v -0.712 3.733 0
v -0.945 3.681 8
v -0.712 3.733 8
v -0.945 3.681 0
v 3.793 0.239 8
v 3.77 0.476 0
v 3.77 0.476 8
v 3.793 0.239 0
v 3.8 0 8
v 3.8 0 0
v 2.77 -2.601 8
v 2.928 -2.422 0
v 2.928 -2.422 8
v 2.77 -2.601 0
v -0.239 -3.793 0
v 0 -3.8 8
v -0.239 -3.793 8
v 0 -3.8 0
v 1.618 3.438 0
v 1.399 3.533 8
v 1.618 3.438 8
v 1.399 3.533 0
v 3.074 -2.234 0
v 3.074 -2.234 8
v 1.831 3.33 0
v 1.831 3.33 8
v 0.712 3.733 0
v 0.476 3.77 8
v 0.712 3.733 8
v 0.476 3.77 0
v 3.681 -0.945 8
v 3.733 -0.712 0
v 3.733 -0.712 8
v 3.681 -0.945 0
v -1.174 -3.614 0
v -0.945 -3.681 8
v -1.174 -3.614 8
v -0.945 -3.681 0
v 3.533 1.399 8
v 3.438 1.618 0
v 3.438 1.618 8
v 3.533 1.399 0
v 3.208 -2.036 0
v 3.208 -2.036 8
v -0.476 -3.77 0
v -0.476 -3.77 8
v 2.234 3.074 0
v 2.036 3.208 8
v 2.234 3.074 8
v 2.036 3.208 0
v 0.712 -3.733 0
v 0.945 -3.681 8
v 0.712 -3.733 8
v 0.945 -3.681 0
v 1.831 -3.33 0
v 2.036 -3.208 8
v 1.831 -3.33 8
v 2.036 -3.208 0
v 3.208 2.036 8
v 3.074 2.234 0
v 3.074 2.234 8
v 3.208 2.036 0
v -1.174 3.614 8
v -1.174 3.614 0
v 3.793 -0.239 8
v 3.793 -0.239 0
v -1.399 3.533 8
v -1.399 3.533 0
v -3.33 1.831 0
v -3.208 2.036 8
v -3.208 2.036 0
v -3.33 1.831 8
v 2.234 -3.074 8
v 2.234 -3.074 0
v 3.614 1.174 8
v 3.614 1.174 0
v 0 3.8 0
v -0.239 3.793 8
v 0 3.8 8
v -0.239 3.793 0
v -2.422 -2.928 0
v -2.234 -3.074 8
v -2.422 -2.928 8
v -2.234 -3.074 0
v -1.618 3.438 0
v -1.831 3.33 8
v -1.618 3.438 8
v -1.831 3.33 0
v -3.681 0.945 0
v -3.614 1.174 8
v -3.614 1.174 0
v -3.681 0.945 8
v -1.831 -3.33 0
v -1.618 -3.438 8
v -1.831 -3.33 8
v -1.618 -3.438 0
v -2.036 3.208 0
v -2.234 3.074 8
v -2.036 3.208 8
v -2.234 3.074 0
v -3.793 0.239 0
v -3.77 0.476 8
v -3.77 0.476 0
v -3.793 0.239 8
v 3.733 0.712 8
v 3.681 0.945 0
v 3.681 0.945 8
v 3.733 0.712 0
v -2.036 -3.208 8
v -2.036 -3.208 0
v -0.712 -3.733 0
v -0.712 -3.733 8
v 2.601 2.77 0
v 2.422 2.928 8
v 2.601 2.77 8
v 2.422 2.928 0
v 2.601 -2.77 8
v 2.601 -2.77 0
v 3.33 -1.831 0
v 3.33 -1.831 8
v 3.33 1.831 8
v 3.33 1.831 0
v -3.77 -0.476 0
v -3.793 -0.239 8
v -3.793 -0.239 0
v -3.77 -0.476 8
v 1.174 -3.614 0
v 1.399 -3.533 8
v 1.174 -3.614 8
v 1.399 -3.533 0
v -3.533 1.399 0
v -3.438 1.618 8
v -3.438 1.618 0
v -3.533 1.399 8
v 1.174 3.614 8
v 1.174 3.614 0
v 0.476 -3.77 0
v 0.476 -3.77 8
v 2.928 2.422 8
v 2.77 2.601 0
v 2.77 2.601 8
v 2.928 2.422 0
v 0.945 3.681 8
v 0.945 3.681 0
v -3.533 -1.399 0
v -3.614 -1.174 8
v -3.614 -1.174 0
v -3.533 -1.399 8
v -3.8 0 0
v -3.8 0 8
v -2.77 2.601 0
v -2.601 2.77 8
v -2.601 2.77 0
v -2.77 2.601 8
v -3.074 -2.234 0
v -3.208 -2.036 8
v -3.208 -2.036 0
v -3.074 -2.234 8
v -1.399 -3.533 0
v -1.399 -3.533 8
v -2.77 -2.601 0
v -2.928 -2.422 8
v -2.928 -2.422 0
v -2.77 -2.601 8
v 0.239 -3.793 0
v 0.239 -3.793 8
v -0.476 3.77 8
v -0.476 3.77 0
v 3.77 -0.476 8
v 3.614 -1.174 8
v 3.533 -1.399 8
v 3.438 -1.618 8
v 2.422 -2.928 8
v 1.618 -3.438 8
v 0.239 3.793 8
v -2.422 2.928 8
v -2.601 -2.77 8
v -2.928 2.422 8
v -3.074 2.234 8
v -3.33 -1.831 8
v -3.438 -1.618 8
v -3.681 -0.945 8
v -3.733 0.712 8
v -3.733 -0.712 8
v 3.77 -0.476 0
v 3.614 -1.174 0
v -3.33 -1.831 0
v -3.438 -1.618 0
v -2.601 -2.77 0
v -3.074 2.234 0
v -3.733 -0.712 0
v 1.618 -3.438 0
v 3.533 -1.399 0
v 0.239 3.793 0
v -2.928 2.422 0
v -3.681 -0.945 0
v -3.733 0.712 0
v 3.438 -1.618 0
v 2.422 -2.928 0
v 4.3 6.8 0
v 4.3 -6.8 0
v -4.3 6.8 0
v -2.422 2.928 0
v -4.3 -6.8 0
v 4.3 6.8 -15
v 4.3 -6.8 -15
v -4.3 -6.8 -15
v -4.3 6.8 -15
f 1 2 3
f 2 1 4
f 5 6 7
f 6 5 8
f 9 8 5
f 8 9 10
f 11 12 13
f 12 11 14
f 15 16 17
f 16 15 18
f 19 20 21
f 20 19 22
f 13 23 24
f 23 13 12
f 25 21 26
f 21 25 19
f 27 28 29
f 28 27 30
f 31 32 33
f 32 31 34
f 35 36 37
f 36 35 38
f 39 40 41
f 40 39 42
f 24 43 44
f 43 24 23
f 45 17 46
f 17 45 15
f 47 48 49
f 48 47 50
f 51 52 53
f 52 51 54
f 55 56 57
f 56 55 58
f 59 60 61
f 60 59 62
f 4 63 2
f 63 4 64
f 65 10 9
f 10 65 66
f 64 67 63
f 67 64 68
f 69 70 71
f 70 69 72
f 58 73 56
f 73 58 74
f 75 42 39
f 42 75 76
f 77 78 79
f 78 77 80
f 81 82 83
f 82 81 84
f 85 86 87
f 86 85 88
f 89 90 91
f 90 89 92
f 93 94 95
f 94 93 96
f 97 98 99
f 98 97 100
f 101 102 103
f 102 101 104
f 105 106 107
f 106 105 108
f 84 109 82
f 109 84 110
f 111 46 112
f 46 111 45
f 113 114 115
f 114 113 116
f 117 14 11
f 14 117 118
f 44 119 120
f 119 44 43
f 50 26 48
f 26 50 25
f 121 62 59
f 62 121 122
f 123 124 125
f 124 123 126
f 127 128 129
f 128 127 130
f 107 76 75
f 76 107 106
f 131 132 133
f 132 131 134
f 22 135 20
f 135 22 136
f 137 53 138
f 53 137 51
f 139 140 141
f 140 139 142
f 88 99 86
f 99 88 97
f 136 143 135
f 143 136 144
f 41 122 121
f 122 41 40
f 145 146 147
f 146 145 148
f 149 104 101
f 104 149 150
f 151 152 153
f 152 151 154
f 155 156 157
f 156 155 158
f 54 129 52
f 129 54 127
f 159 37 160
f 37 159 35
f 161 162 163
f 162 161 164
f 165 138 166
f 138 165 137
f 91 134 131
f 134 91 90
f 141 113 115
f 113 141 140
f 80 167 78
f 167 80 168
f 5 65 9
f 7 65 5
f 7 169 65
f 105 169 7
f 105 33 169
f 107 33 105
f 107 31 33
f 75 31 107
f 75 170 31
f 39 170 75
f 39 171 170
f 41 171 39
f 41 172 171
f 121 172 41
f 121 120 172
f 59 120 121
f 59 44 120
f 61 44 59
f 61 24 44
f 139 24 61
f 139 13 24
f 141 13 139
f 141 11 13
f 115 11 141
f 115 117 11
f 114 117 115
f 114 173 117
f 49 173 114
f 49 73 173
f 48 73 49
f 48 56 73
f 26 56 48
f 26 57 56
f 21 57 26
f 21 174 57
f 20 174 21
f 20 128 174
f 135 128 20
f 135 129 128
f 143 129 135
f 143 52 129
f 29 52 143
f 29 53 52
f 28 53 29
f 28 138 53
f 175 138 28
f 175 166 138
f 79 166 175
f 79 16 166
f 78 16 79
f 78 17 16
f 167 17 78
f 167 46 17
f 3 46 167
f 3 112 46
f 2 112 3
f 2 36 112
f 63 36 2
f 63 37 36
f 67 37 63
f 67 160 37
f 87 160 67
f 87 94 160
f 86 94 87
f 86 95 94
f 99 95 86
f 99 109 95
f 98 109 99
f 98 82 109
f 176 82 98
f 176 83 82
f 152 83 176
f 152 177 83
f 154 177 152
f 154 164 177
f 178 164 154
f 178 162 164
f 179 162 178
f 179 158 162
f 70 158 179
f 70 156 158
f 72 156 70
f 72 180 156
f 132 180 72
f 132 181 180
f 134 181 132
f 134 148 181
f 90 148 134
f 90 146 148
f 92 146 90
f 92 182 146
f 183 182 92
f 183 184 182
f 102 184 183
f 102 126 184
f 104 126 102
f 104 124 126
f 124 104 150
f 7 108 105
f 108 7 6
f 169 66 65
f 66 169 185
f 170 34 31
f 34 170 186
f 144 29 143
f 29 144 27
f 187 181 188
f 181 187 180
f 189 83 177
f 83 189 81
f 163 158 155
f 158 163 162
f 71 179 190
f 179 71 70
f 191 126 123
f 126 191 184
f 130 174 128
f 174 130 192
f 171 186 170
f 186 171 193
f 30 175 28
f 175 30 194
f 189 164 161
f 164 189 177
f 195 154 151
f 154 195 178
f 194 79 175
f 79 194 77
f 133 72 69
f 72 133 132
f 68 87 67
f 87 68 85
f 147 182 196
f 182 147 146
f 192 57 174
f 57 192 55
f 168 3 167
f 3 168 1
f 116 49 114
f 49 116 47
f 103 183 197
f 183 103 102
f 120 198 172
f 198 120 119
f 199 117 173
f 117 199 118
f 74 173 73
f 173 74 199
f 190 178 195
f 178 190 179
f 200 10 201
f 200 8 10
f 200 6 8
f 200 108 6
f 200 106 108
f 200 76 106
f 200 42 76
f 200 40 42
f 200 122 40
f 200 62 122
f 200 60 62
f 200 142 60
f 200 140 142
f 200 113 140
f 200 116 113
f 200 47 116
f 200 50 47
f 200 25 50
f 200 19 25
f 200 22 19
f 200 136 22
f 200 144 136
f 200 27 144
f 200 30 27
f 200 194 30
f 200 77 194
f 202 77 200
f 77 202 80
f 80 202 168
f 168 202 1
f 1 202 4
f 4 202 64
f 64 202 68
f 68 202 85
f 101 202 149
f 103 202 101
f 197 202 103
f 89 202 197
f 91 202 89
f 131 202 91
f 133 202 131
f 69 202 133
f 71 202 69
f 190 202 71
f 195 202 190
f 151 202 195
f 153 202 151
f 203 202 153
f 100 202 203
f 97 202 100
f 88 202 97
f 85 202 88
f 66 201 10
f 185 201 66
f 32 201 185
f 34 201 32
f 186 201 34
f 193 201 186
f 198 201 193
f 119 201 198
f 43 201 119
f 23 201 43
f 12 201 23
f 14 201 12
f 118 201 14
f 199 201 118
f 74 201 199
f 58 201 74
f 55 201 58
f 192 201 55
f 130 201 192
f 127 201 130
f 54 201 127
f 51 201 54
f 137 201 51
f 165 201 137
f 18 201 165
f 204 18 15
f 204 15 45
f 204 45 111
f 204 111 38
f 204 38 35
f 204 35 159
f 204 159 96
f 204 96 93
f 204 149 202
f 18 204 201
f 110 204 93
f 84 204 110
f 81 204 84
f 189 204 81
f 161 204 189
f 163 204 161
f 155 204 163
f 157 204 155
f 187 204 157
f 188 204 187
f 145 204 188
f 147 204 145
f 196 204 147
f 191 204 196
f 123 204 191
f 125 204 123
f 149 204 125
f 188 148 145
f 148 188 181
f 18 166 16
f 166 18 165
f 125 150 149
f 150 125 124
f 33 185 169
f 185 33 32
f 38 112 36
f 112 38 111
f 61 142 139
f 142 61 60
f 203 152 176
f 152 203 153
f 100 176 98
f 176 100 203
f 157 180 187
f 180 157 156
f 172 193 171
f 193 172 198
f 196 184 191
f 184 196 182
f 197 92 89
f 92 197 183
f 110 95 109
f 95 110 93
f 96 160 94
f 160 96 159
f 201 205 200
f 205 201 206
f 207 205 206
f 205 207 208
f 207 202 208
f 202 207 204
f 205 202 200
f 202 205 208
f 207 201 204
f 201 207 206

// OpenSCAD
tolerance = 0.3;
$fn = $preview ? 20 : 100;

module switch(width=8){
    cylinder(r = 3.5 + tolerance, h = 8);
    
    translate([0, 0, -7.5])
    cube([width + tolerance * 2, 13 + tolerance * 2, 15], center = true);
}

switch();
